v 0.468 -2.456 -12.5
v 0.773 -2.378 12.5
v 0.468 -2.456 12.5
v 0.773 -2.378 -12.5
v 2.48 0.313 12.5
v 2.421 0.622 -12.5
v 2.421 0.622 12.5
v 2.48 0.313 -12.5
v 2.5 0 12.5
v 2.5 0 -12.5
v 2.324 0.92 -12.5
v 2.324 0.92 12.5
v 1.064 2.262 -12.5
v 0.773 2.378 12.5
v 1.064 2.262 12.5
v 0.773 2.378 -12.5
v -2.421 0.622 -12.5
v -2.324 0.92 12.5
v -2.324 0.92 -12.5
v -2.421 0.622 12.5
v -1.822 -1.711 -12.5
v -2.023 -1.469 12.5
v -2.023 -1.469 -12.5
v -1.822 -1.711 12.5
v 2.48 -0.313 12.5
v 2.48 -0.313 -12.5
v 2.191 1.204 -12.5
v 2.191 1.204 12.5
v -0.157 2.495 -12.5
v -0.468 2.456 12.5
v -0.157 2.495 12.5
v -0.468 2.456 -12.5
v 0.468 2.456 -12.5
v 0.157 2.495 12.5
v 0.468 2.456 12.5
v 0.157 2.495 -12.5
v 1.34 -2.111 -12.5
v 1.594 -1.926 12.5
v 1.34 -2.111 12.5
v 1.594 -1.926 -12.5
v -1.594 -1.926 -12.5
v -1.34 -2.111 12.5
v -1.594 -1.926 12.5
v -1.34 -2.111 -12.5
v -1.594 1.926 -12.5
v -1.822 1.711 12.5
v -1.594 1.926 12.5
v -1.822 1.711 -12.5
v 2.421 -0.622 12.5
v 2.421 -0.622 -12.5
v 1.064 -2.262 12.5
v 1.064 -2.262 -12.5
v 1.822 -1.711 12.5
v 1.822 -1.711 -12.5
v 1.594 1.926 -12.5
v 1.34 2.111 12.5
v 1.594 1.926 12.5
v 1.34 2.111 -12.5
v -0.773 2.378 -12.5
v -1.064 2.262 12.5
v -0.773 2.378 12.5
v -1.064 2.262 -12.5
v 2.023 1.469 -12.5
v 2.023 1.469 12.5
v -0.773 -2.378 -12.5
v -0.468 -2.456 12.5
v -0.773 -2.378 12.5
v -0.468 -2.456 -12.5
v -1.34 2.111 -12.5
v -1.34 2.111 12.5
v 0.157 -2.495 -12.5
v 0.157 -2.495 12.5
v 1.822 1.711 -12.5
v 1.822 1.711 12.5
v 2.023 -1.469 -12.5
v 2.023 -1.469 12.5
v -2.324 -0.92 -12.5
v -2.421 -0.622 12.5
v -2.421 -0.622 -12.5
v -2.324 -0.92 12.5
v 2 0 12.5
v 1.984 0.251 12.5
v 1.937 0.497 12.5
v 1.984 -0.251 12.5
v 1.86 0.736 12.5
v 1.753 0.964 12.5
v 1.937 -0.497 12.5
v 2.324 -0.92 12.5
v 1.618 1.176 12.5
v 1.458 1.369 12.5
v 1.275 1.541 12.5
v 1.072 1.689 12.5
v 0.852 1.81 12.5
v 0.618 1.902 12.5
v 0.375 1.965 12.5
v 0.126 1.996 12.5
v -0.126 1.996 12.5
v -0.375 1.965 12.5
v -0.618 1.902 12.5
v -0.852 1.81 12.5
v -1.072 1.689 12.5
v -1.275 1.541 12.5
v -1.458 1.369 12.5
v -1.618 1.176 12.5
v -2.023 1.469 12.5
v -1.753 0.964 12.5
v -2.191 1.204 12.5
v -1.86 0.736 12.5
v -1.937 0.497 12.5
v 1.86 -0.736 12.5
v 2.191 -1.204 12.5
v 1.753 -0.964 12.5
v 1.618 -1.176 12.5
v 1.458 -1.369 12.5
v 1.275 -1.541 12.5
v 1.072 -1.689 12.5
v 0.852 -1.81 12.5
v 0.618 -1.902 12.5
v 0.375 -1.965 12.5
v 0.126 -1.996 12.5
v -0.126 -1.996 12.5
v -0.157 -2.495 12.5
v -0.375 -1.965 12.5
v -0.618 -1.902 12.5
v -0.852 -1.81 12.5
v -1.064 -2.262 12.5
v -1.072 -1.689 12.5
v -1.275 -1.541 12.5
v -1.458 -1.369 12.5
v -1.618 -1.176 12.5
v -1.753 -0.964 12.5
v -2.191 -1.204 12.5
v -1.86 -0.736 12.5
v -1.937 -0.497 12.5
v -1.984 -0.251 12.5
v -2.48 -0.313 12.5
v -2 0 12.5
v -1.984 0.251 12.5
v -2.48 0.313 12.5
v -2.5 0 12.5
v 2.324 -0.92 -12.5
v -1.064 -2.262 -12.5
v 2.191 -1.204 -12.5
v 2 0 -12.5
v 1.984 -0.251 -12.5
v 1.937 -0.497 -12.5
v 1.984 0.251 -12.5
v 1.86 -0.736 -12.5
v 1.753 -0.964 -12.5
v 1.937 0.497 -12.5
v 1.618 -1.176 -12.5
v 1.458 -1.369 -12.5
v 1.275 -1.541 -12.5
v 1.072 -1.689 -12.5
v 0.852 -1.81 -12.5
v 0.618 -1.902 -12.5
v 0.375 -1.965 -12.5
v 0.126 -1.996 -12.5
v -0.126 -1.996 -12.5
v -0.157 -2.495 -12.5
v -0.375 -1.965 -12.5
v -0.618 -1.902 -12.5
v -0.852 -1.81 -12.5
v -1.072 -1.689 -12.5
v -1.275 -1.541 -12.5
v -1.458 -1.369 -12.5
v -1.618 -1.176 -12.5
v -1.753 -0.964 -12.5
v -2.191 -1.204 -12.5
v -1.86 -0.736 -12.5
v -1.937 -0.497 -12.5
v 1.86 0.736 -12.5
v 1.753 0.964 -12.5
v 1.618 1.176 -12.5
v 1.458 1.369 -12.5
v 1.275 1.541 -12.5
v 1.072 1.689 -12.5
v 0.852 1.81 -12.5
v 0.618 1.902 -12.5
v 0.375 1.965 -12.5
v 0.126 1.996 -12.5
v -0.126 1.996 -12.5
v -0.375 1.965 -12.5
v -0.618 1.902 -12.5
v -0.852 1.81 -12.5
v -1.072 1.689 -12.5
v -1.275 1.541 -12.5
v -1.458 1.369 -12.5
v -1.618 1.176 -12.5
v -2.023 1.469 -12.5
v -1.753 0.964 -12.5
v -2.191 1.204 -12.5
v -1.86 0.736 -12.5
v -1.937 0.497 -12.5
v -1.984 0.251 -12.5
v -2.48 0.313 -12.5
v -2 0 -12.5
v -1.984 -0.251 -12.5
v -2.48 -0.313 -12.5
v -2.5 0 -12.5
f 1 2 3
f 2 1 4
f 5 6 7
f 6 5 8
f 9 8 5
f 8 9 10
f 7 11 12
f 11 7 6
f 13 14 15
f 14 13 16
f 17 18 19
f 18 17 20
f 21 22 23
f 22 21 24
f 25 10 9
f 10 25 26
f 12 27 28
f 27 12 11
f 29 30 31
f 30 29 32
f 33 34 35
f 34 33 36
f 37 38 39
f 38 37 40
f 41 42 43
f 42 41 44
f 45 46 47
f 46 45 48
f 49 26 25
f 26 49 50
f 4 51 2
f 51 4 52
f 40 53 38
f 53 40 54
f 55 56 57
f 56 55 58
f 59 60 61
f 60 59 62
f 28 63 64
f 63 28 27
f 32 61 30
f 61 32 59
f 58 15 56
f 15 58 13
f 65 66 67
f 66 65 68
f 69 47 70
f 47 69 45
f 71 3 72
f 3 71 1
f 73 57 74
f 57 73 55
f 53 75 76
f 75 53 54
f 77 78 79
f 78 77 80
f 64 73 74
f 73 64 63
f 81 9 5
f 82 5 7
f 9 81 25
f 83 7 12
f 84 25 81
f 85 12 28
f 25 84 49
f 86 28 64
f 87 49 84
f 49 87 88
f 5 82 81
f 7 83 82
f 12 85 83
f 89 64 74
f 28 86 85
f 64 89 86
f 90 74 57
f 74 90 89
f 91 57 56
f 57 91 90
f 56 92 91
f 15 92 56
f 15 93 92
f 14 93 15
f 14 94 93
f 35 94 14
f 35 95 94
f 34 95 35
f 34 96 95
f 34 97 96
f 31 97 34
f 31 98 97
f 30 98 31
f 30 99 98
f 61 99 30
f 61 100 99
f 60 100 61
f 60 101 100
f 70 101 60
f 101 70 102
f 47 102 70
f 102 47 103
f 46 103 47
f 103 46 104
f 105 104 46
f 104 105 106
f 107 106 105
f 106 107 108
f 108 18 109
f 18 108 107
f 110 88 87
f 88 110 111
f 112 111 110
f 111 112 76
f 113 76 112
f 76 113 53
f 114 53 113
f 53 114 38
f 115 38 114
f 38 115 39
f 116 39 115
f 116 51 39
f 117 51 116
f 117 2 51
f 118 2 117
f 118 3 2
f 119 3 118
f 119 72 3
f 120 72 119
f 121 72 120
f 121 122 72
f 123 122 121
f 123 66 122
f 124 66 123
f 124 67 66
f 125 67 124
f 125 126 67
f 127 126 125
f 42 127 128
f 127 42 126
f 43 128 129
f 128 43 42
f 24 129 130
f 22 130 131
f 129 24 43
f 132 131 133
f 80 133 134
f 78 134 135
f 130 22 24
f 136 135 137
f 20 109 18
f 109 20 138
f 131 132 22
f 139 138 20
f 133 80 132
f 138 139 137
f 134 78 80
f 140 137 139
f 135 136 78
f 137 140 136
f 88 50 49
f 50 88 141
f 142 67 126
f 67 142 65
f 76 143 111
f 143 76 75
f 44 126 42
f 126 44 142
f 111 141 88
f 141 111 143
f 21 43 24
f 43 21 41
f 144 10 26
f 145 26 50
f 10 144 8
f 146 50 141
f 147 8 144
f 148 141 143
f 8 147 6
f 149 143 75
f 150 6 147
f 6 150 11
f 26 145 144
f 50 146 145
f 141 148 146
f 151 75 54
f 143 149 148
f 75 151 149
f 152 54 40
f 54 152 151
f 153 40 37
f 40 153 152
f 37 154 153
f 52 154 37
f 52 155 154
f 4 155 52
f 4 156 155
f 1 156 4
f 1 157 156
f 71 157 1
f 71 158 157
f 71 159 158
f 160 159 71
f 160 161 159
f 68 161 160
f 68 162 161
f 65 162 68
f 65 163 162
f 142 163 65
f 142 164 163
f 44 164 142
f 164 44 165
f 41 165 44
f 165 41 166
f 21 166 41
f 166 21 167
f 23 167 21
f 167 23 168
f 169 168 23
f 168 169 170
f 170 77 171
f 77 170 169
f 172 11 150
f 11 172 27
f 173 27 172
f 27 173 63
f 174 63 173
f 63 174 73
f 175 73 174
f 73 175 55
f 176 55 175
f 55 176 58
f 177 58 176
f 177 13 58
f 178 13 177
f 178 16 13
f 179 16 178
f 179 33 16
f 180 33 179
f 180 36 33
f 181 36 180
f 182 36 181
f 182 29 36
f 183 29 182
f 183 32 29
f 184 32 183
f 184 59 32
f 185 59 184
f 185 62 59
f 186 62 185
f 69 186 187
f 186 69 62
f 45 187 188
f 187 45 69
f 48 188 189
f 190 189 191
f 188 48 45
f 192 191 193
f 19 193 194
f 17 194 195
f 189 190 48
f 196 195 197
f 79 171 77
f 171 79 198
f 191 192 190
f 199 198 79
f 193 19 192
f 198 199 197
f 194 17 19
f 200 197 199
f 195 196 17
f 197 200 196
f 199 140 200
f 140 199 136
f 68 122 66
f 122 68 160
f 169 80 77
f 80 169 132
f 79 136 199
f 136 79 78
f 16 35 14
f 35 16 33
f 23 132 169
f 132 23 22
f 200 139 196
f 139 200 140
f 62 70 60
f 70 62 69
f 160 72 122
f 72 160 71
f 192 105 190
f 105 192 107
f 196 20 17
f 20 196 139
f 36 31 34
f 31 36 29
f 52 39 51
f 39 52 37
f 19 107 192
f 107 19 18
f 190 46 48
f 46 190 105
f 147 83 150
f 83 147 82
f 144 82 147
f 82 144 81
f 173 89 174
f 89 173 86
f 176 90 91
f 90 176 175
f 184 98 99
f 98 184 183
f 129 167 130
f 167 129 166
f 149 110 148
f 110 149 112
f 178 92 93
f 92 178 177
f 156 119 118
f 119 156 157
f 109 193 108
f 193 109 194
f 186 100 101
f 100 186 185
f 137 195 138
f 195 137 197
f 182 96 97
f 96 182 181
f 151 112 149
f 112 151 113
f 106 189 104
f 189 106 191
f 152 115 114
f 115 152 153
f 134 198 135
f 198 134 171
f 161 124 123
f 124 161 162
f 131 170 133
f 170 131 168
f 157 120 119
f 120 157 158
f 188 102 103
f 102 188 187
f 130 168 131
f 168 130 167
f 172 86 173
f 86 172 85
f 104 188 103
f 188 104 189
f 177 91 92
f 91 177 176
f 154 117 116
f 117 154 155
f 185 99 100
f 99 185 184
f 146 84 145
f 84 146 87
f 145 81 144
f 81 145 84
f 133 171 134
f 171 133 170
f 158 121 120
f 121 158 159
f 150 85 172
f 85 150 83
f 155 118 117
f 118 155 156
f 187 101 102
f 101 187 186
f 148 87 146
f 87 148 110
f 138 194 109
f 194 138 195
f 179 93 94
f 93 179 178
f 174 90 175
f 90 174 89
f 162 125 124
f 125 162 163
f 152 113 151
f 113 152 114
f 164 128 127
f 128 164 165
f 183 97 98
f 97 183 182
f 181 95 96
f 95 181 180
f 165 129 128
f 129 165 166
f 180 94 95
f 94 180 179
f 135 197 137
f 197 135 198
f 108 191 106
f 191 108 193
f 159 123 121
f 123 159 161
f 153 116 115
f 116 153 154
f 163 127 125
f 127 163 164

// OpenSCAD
$fn = 50;


difference() {
	union() {
		translate(v = [0, 0, -12.5000000000]) {
			cylinder(h = 25, r = 2.5000000000);
		}
	}
	union() {
		translate(v = [0, 0, -100.0000000000]) {
			cylinder(h = 200, r = 2.0000000000);
		}
	}
}
